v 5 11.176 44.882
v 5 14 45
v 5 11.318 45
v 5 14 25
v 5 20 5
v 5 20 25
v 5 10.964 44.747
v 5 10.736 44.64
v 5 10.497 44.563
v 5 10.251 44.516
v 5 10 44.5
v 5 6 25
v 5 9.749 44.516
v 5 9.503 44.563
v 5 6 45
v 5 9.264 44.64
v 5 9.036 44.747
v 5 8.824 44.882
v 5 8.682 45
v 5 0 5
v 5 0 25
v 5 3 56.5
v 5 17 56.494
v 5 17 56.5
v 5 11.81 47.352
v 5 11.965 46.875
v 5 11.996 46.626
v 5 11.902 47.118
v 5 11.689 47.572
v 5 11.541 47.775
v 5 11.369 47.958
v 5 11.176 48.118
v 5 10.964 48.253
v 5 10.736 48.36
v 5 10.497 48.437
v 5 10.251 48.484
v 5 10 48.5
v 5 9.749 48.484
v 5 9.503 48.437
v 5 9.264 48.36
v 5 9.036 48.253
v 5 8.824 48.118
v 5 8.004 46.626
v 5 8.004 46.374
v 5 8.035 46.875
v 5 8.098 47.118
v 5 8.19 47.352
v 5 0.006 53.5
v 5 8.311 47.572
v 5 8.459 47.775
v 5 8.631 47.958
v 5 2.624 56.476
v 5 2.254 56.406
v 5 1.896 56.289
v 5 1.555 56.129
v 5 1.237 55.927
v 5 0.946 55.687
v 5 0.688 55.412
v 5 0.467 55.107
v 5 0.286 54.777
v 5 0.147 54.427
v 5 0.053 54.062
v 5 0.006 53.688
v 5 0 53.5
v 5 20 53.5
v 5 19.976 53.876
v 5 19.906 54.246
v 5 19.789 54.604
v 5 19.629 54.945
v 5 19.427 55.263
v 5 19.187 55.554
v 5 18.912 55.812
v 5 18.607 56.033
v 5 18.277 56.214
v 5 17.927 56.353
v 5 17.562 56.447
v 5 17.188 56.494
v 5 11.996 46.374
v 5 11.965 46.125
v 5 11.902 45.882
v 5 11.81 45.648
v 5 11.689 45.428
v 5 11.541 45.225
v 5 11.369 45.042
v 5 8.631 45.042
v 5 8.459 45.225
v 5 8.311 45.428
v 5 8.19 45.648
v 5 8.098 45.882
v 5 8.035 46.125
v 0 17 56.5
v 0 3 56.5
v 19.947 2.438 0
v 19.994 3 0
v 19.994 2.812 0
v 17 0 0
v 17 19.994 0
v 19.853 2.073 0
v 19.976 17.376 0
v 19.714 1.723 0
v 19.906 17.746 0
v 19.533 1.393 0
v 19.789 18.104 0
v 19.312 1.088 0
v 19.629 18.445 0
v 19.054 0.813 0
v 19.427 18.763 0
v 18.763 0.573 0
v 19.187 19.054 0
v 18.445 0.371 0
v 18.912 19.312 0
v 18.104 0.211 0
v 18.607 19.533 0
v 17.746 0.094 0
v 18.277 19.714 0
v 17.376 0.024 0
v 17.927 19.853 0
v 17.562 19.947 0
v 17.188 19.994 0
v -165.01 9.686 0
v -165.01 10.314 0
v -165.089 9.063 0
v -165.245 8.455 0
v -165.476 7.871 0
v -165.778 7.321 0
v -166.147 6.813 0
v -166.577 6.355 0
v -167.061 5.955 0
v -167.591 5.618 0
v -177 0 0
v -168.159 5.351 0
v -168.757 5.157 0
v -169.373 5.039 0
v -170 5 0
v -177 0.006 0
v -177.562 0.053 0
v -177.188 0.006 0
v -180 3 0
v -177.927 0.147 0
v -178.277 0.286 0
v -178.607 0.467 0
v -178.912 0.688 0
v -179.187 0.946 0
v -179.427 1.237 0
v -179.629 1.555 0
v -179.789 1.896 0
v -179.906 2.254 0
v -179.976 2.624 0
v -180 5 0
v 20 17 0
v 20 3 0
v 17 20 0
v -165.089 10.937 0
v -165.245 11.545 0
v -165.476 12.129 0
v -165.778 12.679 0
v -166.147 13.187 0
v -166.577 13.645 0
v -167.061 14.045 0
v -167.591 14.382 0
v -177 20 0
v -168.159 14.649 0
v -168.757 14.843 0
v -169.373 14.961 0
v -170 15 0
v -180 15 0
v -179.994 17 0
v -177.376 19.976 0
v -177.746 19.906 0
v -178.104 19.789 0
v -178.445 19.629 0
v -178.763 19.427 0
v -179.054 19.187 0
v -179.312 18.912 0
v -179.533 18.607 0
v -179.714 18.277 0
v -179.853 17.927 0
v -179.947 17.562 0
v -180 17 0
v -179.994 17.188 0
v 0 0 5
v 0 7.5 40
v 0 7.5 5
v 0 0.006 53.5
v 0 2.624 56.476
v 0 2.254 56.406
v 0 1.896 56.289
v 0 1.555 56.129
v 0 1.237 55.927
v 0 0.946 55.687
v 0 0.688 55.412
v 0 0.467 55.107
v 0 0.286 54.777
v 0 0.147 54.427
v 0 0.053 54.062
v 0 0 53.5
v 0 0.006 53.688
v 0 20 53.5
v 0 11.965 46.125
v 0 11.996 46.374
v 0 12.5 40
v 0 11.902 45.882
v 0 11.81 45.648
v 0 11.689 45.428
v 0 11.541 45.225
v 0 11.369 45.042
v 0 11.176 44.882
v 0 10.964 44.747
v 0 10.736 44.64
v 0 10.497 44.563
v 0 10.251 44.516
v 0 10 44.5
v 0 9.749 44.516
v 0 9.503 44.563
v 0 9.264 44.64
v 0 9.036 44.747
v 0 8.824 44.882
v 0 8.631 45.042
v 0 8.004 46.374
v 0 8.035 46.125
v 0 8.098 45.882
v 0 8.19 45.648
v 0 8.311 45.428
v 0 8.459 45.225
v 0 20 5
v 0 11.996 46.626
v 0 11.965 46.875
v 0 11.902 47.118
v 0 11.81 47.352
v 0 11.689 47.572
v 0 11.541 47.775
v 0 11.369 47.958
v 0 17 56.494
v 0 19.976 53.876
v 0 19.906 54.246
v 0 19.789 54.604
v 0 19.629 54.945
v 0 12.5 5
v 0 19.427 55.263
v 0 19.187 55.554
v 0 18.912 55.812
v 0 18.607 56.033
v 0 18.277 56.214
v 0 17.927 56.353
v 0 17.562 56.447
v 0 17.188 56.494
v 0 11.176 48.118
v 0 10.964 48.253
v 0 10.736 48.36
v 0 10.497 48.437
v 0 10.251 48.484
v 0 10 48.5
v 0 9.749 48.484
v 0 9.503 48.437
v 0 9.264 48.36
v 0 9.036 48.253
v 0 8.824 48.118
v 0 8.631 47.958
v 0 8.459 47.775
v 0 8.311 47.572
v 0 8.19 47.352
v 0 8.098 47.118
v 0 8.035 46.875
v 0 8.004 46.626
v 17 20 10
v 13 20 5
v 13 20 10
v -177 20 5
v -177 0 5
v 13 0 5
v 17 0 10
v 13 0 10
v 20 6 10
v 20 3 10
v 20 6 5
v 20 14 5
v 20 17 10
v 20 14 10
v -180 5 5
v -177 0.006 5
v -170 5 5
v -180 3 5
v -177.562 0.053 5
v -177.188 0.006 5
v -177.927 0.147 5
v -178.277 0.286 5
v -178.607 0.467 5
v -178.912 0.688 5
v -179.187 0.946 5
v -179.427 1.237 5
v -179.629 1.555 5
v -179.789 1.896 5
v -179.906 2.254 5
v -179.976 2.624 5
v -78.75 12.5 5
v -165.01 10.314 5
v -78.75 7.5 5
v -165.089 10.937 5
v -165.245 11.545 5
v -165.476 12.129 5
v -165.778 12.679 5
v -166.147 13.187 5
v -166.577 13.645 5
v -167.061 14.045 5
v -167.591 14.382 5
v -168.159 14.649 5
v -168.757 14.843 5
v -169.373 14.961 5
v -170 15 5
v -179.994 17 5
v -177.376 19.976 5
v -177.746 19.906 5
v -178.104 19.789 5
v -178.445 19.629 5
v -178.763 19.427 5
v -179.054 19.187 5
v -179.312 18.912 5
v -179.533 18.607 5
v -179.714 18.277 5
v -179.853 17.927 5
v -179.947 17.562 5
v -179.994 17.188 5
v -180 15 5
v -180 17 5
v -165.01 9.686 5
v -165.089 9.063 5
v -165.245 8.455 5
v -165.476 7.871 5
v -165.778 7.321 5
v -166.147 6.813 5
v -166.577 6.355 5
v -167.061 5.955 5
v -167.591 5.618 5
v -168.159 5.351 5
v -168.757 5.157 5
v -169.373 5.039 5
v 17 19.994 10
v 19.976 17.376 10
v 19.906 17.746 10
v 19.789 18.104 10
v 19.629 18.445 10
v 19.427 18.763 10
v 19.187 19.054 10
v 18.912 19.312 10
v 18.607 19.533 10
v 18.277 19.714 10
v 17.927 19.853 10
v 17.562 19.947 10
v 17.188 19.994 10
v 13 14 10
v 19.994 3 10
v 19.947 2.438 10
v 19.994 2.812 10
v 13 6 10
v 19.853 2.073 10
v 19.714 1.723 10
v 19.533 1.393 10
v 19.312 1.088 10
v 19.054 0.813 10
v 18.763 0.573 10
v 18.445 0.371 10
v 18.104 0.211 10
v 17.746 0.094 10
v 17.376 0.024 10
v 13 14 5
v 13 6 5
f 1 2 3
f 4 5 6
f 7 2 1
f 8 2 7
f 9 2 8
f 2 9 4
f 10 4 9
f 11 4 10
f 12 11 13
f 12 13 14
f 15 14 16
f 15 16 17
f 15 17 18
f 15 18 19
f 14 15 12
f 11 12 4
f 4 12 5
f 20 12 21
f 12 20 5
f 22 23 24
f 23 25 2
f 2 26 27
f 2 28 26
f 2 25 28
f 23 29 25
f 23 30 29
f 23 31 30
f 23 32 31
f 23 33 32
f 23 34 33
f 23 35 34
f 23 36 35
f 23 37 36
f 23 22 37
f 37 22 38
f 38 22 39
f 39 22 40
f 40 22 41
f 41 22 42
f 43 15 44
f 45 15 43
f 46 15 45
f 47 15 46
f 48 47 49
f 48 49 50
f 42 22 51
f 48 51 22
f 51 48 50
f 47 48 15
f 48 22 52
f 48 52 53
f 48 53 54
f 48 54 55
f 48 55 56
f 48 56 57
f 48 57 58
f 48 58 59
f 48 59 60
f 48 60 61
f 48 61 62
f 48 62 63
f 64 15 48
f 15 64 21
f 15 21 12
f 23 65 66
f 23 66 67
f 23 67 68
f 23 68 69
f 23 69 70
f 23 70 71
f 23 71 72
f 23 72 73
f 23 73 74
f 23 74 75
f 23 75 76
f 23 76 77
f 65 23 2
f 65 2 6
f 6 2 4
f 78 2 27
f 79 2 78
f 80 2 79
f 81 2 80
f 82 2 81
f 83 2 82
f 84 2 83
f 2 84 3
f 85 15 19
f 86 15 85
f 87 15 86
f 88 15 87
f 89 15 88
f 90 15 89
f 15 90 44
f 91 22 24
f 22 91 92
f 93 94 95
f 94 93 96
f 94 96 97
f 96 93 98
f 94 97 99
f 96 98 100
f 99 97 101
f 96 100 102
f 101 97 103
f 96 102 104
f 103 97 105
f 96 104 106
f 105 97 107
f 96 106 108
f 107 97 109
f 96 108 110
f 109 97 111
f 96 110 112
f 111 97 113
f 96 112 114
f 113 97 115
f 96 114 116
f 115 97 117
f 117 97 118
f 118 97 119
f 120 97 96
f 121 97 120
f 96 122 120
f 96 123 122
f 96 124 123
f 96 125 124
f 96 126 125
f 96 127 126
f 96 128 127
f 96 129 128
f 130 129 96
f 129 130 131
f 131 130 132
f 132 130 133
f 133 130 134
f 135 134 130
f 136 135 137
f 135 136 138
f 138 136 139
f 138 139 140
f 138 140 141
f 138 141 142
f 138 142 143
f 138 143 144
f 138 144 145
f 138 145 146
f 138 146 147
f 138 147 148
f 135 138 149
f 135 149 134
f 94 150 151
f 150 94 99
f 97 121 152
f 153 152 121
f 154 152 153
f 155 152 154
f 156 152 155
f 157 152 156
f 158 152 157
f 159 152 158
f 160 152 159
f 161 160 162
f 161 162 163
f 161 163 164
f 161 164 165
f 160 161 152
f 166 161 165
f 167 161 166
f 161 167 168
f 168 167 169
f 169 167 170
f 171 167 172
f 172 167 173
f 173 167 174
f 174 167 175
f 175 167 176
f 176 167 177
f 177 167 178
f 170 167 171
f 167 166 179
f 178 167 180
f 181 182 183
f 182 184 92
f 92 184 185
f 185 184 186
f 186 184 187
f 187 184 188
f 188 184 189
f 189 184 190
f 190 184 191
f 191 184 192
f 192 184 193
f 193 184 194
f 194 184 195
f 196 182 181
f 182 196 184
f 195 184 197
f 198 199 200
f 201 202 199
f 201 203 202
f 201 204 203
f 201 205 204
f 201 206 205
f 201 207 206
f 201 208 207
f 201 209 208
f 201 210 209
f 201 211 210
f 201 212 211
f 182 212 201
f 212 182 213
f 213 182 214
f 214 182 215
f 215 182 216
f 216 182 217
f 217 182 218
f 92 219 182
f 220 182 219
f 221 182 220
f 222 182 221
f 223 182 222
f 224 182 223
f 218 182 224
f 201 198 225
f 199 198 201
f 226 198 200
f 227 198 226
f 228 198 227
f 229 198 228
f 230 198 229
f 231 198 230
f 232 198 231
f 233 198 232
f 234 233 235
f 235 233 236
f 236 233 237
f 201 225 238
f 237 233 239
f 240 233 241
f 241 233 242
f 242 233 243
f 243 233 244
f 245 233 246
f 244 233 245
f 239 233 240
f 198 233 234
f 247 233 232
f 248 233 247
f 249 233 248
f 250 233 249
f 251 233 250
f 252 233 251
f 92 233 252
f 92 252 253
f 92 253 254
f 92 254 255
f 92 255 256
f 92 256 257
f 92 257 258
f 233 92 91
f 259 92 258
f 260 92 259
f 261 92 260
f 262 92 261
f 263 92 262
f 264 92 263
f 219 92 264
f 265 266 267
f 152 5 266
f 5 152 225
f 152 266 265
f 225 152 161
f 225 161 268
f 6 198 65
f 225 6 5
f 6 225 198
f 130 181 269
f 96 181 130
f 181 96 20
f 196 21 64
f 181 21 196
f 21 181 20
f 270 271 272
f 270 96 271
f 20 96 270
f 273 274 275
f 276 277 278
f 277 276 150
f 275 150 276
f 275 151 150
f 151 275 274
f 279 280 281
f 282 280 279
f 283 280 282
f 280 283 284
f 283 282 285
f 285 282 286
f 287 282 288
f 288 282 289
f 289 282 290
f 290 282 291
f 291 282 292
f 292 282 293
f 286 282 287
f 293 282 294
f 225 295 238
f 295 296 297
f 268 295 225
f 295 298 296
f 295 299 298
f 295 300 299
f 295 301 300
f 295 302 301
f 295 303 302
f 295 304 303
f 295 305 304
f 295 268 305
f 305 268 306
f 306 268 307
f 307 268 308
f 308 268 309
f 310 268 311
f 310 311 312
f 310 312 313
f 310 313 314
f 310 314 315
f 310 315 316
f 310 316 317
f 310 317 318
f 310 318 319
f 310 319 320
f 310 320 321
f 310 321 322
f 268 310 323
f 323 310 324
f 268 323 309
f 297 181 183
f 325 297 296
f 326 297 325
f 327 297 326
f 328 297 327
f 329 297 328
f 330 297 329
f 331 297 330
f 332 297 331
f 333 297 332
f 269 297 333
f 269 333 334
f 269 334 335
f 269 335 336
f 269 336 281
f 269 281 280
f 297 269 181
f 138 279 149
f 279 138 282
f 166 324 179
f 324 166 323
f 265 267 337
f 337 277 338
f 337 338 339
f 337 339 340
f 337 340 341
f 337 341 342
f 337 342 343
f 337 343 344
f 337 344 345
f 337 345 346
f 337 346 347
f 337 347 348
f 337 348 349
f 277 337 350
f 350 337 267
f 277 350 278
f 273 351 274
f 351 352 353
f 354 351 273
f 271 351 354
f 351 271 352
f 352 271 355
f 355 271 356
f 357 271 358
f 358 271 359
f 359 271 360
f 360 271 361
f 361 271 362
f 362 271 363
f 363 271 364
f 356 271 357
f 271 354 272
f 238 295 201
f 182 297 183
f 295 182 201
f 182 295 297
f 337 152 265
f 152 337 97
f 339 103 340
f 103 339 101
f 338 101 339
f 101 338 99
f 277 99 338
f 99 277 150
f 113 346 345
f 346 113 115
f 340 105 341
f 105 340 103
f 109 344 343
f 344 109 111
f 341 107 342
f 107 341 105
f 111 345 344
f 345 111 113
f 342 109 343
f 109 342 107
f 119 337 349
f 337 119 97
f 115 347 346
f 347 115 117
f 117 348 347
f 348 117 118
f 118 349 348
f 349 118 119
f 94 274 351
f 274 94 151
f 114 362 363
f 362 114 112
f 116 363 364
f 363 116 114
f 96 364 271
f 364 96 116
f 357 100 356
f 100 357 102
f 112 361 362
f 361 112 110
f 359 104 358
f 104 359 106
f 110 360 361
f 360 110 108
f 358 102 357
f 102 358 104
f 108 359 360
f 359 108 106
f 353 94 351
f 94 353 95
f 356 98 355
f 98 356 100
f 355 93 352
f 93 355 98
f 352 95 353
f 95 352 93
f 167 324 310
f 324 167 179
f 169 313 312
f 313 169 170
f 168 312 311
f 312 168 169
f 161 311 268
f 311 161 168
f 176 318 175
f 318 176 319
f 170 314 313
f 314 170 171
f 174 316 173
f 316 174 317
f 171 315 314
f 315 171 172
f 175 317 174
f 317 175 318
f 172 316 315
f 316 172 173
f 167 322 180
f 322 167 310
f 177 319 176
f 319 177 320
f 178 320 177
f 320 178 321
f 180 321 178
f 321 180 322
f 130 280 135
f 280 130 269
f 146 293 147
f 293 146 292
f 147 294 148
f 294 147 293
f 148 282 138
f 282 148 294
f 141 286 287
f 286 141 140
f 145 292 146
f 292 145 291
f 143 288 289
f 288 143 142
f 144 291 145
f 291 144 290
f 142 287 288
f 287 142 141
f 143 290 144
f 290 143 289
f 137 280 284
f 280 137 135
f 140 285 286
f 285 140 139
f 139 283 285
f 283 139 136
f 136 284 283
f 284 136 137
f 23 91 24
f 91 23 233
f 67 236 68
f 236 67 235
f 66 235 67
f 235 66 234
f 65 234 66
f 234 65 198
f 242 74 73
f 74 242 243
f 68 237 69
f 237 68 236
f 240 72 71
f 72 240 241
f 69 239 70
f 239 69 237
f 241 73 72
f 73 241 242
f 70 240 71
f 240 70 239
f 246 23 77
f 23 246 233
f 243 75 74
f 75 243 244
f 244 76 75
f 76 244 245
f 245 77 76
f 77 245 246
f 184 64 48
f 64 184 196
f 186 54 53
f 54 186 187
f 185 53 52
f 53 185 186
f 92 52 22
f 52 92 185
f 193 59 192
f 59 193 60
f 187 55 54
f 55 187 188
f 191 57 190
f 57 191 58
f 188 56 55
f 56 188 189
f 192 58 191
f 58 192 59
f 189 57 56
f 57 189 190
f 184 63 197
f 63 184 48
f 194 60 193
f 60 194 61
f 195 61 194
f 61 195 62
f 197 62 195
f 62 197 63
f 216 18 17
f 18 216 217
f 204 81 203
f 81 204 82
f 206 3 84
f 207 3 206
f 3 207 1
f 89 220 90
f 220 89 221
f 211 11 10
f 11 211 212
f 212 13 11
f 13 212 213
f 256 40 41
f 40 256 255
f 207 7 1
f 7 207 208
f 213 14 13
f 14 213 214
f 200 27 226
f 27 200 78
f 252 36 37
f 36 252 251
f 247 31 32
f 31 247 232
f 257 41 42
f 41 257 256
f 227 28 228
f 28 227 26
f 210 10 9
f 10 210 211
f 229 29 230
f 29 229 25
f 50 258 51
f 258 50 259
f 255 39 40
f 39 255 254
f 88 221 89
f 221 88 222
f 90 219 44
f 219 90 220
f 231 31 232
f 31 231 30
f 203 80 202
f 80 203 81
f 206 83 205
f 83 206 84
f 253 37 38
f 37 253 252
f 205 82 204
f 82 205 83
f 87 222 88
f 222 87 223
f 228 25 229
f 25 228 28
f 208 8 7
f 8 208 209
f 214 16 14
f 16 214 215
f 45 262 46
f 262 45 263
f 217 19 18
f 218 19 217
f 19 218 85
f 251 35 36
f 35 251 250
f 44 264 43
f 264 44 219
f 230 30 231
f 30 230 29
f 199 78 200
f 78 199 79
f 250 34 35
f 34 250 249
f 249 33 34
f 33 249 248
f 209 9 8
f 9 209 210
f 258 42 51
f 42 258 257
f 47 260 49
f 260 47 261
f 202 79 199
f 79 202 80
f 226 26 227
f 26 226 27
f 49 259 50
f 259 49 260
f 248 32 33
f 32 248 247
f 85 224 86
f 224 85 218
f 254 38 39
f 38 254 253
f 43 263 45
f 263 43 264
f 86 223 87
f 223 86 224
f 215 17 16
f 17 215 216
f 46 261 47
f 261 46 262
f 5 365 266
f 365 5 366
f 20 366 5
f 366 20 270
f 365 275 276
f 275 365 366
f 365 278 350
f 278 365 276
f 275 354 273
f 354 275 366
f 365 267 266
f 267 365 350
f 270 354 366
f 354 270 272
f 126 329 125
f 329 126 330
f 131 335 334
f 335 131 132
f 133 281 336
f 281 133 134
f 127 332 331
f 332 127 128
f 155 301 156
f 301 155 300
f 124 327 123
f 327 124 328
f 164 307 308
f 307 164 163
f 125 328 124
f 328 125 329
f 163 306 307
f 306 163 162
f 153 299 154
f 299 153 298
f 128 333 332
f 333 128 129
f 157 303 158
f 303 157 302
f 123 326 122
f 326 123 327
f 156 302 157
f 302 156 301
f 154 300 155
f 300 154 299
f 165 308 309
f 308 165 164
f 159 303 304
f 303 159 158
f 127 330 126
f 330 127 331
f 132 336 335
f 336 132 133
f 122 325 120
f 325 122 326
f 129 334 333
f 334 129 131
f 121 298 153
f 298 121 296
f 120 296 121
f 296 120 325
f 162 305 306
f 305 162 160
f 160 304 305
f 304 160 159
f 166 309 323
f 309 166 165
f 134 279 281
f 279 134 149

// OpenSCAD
$fn=50;
$thin=5;
$length=180;
$axe=10;
$width=20;
$holeposition=46.5;
$rounding=3;

difference()
{
    // body
    union()
    {
    cube([$thin,$width,$holeposition+10]);
    translate([-$length,0,0]) cube([$length+$width,$width,$thin]);
    cube([$width,$width,10]);
	translate([0,$width/2,0])
		rotate([0,270,90]) 
			linear_extrude(height = $thin, center = true)
				polygon(points=[[0,0],[40,0],[0,90]], paths=[[0,1,2]]);
    }
    
    // screw hole
    translate([0,10,$holeposition]) rotate([0,90,0]) cylinder(100,2,2);
    
    // holder hole
    translate([$thin,10-4,$thin]) cube([40,8,40]);
    translate([$thin,0,$thin]) cube([8,$width,$width]);

    // top hole
    translate([-$length+10,10,0]) rotate([0,0,90]) cylinder(100,$axe/2,$axe/2);
    translate([-$length,5,0]) cube([10,10,20]);

	// cosmetics
	translate([$width,$width,0]) roundcorner($rounding,0);
	translate([$width,0,0]) roundcorner($rounding,270);
	translate([-$length,$width,0]) roundcorner($rounding,90);
	translate([-$length,0,0]) roundcorner($rounding,180);	
	translate([0,$width,$holeposition+10]) rotate([0,90,0]) roundcorner($rounding,90);
	translate([0,0,$holeposition+10]) rotate([0,90,0]) roundcorner($rounding,180);
}

module roundcorner(rounding, angle)
{
	rotate([0,0,angle])
	difference()
	{
		translate([-rounding,-rounding,0]) 
			cube([rounding*2,rounding*2,100]);
		translate([-rounding,-rounding,0])
			cylinder(100,rounding,rounding);
	}
}
